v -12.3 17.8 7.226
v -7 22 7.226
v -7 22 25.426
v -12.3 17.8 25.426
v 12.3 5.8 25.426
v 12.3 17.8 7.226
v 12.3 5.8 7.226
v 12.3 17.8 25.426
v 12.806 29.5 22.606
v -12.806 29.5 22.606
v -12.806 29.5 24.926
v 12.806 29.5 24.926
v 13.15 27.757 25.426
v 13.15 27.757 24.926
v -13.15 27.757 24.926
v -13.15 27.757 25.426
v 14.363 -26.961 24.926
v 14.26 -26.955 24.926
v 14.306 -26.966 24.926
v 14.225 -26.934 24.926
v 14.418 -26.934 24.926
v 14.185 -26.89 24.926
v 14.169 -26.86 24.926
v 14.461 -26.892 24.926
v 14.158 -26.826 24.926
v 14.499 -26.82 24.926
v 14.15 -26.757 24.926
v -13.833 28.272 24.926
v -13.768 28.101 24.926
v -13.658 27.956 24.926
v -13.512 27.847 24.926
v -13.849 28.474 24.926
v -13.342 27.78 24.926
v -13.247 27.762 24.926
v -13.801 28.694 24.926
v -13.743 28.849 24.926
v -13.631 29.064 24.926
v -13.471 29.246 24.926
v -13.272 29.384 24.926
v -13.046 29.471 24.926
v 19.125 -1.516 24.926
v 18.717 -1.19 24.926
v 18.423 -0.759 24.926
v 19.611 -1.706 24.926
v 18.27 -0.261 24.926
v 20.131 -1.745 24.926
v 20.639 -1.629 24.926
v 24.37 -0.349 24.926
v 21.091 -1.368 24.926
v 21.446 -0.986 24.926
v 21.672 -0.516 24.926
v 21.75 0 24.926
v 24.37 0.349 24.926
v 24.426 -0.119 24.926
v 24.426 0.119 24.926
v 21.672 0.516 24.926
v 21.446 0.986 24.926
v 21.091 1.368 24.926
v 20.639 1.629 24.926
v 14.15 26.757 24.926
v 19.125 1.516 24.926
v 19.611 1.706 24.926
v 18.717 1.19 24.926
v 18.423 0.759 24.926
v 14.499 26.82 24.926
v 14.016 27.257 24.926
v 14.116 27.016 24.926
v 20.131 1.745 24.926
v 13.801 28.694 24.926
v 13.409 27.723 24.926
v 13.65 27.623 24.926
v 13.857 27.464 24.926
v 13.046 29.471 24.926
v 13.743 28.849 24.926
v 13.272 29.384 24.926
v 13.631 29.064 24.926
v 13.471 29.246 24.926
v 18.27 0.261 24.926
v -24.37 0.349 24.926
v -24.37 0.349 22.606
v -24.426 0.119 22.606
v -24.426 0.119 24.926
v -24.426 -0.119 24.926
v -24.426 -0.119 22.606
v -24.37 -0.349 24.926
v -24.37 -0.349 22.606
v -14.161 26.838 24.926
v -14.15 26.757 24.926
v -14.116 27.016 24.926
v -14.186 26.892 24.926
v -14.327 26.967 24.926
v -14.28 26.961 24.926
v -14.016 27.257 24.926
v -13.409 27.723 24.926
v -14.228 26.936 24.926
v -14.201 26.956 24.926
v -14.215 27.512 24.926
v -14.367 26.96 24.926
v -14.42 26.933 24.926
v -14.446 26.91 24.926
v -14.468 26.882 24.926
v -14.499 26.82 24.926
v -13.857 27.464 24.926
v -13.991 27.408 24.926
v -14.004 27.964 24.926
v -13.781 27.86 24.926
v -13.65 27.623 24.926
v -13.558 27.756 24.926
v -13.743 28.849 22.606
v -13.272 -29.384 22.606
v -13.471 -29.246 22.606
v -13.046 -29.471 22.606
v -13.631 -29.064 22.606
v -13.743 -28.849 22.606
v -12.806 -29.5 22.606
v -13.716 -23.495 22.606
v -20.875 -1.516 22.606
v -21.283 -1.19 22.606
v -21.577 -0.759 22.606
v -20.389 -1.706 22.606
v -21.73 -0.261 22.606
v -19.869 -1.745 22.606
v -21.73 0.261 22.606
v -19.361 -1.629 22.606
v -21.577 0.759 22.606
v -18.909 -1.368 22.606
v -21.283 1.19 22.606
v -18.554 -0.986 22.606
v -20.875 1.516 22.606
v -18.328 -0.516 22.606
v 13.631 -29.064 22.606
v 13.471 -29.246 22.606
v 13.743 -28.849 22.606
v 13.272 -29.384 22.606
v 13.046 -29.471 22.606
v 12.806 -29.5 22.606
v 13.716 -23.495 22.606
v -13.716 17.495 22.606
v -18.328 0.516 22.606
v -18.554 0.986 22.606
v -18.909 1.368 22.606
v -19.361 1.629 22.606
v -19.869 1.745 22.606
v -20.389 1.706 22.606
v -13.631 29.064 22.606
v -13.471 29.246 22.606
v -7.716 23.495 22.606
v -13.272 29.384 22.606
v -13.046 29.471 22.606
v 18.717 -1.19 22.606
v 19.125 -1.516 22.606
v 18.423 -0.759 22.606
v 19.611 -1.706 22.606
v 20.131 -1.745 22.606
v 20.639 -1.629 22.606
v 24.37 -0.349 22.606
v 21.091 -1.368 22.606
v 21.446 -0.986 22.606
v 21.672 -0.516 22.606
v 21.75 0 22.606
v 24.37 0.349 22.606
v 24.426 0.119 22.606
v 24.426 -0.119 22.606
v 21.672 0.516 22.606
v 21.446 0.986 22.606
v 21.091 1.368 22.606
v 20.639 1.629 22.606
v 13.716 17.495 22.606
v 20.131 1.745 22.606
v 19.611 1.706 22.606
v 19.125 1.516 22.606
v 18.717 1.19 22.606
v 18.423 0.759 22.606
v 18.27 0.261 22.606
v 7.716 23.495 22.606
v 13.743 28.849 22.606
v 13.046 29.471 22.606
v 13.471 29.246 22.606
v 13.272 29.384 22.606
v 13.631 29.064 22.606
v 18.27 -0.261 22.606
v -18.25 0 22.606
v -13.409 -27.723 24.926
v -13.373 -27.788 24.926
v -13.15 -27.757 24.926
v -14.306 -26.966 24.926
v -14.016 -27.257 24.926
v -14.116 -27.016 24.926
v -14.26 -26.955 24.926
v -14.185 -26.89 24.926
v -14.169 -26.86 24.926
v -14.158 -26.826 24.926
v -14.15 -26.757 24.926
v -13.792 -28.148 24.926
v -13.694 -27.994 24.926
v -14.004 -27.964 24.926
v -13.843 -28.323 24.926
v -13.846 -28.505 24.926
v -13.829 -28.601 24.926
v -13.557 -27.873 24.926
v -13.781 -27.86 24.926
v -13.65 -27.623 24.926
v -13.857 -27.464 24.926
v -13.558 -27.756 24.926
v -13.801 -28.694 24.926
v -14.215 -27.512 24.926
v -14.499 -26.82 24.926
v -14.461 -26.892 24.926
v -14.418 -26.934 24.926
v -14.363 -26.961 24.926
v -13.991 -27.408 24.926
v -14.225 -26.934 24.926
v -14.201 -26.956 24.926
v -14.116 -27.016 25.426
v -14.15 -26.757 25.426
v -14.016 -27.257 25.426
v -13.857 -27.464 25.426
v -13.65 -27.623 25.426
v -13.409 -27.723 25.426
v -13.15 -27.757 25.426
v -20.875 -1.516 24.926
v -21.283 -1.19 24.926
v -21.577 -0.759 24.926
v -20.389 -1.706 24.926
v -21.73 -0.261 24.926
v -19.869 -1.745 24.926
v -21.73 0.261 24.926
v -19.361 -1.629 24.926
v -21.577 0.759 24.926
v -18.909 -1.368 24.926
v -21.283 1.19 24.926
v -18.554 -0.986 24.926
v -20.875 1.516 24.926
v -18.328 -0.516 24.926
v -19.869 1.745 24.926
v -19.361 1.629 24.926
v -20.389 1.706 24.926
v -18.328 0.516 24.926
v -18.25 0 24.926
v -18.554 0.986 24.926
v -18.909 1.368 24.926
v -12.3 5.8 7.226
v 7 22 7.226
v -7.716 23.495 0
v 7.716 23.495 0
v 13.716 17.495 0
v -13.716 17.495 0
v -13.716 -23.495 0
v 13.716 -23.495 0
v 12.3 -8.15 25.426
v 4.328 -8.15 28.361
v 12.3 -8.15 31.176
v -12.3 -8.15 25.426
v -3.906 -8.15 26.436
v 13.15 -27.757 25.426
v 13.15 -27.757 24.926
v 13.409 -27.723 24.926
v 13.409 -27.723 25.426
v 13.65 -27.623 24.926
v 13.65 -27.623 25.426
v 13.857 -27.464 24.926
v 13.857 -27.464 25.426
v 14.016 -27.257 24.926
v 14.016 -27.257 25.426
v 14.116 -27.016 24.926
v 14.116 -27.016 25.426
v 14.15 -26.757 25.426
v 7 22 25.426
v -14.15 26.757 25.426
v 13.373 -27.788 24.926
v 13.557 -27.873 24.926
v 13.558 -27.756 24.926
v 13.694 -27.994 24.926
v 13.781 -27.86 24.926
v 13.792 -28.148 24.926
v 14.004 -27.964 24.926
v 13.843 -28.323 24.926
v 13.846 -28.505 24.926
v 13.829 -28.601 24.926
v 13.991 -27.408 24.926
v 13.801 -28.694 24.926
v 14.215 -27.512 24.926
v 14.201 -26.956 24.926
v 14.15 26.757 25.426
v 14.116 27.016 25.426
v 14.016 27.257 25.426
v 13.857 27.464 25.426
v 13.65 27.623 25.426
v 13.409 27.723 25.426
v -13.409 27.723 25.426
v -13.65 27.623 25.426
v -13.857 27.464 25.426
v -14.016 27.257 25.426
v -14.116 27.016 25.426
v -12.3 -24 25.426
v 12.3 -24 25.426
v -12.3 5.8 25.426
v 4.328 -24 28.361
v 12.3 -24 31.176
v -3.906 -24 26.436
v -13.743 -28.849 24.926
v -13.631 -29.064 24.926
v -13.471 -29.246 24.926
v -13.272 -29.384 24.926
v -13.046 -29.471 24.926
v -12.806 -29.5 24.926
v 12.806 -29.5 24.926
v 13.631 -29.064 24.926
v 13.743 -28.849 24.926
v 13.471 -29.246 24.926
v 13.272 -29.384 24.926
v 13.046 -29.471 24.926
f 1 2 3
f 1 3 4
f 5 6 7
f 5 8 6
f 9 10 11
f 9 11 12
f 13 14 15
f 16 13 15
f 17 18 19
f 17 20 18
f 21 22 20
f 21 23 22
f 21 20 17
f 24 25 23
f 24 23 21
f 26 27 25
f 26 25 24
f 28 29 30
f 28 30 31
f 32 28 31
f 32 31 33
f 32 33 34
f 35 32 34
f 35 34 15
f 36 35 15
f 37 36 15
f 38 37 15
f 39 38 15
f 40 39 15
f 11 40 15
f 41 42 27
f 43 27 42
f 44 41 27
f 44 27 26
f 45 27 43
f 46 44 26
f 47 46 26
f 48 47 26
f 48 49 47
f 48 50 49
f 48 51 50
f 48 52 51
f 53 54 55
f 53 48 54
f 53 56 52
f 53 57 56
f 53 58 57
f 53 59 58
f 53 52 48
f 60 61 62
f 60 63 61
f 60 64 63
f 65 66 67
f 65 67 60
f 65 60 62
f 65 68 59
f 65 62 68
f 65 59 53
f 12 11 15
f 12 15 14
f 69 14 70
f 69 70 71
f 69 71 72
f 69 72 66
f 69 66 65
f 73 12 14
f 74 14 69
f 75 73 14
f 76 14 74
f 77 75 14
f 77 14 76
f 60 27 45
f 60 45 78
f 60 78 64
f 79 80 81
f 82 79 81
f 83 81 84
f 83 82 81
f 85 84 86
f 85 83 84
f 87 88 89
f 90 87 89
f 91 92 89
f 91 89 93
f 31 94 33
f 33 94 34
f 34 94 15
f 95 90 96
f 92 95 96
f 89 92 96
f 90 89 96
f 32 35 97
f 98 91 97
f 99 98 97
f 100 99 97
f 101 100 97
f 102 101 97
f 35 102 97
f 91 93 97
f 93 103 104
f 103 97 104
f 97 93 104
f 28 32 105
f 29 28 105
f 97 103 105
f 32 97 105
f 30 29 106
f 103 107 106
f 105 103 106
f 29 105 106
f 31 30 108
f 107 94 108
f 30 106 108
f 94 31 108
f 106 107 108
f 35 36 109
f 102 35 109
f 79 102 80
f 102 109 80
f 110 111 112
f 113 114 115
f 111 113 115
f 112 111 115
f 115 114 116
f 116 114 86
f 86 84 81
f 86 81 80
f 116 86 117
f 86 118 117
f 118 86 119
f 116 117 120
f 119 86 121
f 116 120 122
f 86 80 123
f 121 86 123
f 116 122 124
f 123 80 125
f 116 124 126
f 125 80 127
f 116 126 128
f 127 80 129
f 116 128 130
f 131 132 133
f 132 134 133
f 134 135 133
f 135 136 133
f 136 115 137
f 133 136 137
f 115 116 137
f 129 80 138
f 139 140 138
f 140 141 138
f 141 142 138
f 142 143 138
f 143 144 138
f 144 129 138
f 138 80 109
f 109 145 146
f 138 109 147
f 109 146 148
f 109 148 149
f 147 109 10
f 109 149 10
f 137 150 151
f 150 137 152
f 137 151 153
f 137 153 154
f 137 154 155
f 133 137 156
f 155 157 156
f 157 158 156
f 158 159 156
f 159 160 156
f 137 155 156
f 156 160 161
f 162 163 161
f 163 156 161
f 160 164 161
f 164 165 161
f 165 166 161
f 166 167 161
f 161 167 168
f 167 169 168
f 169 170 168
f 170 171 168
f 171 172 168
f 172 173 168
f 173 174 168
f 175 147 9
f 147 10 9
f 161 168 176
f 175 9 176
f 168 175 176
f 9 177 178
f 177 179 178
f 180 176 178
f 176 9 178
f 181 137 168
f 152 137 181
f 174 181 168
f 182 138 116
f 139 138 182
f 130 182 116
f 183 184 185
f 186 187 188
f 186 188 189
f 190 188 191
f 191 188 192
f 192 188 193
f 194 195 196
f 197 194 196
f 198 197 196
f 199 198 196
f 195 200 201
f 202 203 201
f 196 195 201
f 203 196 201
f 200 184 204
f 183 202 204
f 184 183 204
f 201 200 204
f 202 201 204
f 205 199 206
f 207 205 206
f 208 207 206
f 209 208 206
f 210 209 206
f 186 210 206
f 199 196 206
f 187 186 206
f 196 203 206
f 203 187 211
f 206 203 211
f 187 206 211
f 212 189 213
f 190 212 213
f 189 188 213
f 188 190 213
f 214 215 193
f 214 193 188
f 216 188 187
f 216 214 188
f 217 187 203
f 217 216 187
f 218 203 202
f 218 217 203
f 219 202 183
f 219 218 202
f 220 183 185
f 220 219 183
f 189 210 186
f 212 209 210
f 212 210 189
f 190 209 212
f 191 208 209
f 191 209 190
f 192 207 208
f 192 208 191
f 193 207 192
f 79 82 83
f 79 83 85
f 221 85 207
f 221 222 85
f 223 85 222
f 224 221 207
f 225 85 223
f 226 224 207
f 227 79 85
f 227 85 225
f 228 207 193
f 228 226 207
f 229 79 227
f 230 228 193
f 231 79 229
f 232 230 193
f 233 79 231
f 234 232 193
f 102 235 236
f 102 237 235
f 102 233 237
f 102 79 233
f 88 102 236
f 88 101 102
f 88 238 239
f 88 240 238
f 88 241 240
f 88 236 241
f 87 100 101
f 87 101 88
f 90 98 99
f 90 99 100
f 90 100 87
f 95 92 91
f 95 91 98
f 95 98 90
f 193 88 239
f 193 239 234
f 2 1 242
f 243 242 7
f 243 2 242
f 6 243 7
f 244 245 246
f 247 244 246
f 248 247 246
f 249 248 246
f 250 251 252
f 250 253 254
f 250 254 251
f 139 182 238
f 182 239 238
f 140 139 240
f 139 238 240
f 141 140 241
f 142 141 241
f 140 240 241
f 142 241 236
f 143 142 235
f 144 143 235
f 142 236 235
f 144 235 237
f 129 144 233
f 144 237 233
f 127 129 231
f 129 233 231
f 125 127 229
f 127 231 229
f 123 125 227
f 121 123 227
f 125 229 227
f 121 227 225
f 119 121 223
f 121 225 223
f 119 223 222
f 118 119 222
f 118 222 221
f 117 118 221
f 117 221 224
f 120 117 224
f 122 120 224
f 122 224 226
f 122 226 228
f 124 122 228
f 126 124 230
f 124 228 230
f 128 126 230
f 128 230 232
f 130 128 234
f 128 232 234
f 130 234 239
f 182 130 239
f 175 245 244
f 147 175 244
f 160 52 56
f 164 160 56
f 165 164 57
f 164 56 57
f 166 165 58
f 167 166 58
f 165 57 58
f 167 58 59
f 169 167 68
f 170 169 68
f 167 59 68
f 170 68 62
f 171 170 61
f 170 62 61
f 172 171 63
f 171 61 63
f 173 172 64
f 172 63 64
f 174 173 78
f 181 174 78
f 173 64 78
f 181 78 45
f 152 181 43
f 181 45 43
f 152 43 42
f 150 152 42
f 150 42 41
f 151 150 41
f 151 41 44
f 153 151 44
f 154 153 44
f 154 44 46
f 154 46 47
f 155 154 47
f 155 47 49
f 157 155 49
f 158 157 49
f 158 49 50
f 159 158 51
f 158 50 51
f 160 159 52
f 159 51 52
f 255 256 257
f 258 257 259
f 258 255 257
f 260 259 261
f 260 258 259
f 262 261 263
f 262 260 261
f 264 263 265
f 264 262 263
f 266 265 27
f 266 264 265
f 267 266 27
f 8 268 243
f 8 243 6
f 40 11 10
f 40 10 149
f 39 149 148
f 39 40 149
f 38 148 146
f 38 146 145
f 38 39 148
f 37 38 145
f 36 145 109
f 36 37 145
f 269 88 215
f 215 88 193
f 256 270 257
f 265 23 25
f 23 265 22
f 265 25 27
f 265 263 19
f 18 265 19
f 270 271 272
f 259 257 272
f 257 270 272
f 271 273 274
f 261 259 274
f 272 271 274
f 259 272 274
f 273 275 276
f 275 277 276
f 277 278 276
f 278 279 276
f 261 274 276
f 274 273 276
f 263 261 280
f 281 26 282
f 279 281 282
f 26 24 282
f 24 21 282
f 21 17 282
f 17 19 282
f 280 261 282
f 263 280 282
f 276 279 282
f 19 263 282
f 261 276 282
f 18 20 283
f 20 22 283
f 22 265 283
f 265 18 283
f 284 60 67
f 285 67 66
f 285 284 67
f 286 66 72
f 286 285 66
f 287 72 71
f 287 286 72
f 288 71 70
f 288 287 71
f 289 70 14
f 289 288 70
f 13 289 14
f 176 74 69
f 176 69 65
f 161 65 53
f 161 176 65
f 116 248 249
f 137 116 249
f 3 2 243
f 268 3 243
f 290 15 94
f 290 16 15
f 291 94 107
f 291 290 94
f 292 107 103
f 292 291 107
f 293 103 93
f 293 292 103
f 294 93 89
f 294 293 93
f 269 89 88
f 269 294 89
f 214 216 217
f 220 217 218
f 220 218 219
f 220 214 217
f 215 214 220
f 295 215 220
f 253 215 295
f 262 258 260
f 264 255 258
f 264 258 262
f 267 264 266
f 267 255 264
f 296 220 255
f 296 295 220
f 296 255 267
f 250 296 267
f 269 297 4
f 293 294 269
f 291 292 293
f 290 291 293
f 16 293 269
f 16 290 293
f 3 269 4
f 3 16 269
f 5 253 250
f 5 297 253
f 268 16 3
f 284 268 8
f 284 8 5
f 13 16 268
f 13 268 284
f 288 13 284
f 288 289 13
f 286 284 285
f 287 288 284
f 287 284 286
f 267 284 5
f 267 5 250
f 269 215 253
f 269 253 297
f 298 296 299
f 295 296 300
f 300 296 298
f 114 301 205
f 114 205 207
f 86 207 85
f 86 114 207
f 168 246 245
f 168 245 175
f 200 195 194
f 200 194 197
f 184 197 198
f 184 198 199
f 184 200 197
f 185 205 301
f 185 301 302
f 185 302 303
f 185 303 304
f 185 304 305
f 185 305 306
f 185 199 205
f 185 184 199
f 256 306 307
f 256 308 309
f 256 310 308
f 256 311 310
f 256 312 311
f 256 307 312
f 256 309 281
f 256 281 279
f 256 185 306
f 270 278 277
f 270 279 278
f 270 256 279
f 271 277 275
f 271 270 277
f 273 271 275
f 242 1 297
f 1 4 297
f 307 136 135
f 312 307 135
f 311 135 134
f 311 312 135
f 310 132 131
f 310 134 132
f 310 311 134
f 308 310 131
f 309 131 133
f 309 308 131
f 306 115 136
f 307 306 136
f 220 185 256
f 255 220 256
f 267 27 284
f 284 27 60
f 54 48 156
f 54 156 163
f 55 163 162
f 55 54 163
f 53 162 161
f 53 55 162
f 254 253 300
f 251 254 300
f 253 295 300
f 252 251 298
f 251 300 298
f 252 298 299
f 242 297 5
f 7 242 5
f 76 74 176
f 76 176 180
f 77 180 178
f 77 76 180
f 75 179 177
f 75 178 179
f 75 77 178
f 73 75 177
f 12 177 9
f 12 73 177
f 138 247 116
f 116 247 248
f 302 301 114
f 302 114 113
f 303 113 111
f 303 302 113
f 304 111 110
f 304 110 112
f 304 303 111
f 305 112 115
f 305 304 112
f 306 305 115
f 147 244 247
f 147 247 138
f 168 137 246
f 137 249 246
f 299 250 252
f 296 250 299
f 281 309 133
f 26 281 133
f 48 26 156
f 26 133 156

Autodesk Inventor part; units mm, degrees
ref_plane "YZ Plane" through (0, 0, 0) normal (1, 0, 0) x (0, 1, 0)
ref_plane "XZ Plane" through (0, 0, 0) normal (0, 1, 0) x (-1, 0, 0)
ref_plane "XY Plane" through (0, 0, 0) normal (0, 0, 1) x (1, 0, 0)
sketch "Body" plane through (0, 0, 0) normal (0, 0, 1) x (1, 0, 0)
  line L0 (-13.716, -23.495) -> (13.716, -23.495)
  line L1 (13.716, -23.495) -> (13.716, 23.495)
  line L2 (13.716, 23.495) -> (-13.716, 23.495)
  line L3 (-13.716, 23.495) -> (-13.716, -23.495)
  line L4 (-13.716, -23.495) -> (13.716, 23.495) construction
  line L5 (13.716, -23.495) -> (-13.716, 23.495) construction
  point P0 (0, 0)
  dimension "d0" = 27.432
  dimension "d1" = 46.99
extrude "BodyFeature" add sketch "Body" along normal blind 22.606
chamfer "OutsideChamfersFeature" distance 6 angle 45 2 edges at (13.716, 23.495, 11.303) (-13.716, 23.495, 11.303)
sketch "Mount" plane through (0, 0, 22.606) normal (0, 0, 1) x (1, 0, 0)
  line L0 (-24.5, -29.5) -> (24.5, -29.5) construction
  line L1 (24.5, -29.5) -> (24.5, 29.5) construction
  line L2 (24.5, 29.5) -> (-24.5, 29.5) construction
  line L3 (-24.5, 29.5) -> (-24.5, -29.5) construction
  line L4 (-24.5, -29.5) -> (24.5, 29.5) construction
  line L5 (24.5, -29.5) -> (-24.5, 29.5) construction
  line L6 (-13.5, 29.5) -> (13.5, 29.5)
  line L7 (-13.5, 29.5) -> (-24.5, 0)
  line L8 (13.5, 29.5) -> (24.5, 0)
  line L9 (-33.6, 0) -> (33.6, 0) construction
  line L10 (-13.5, -29.5) -> (13.5, -29.5)
  line L11 (-13.5, -29.5) -> (-24.5, 0)
  line L12 (13.5, -29.5) -> (24.5, 0)
  point P0 (0, 0)
  point P1 (0, 29.5)
  dimension "d7" = 59
  dimension "d8" = 49
  dimension "d9" = 27
extrude "MountFeature" add sketch "Mount" along normal blind 2.32
fillet "MountFilletsFeature" radius 1 6 edges at (-13.5, 29.5, 23.766) (13.5, 29.5, 23.766) (-24.5, 0, 23.766) (24.5, 0, 23.766) (13.5, -29.5, 23.766) (-13.5, -29.5, 23.766)
sketch "MountHoles" plane through (0, 0, 24.926) normal (0, 0, 1) x (1, 0, 0)
  line L0 (-34.3, 0) -> (34.3, 0) construction
  circle A0 centre (-20, 0) radius 1.75
  line L1 (0, -41.3) -> (0, 41.3) construction
  circle A1 centre (20, 0) radius 1.75
  point P0 (0, 0)
  dimension "d13" = 3.5
  dimension "d14" = 40
extrude "MountHolesFeature" cut sketch "MountHoles" against normal blind 3.5
sketch "FrontPanel" plane through (0, 0, 24.926) normal (0, 0, 1) x (1, 0, 0)
  line L0 (-14.15, -27.7568) -> (14.15, -27.7568)
  line L1 (14.15, -27.7568) -> (14.15, 27.7568)
  line L2 (14.15, 27.7568) -> (-14.15, 27.7568)
  line L3 (-14.15, 27.7568) -> (-14.15, -27.7568)
  line L4 (-14.15, -27.7568) -> (14.15, 27.7568) construction
  line L5 (14.15, -27.7568) -> (-14.15, 27.7568) construction
  line L6 (24.3697, 0.3494) -> (13.7426, 28.8494) construction
  point P0 (0, 0)
  dimension "d17" = 28.3
extrude "FrontPanelFeature" add sketch "FrontPanel" along normal blind 0.5
fillet "FrontPanelFilletsFeature" radius 1 4 edges at (-14.15, -27.7568, 25.176) (14.15, -27.7568, 25.176) (-14.15, 27.7568, 25.176) (14.15, 27.7568, 25.176)
sketch "PowerReceptacle" plane through (0, 0, 25.426) normal (0, 0, 1) x (1, 0, 0)
  line L0 (0, -41.3) -> (0, 41.3) construction
  line L1 (-12.3, 22) -> (12.3, 22) construction
  line L2 (12.3, 22) -> (12.3, 5.8) construction
  line L3 (12.3, 5.8) -> (-12.3, 5.8) construction
  line L4 (-12.3, 5.8) -> (-12.3, 22) construction
  line L5 (-12.3, 22) -> (12.3, 5.8) construction
  line L6 (12.3, 22) -> (-12.3, 5.8) construction
  line L7 (12.8056, 29.5) -> (-12.8056, 29.5) construction
  line L8 (-7, 22) -> (7, 22)
  line L9 (-7, 22) -> (-12.3, 17.8)
  line L10 (-12.3, 17.8) -> (-12.3, 5.8)
  line L11 (7.716, 23.495) -> (-7.716, 23.495) projected
  line L12 (7, 22) -> (12.3, 17.8)
  line L13 (12.3, 17.8) -> (12.3, 5.8)
  line L14 (-12.3, 5.8) -> (12.3, 5.8)
  line L15 (14.15, 26.7568) -> (14.15, -26.7568) projected
  point P0 (0, 0)
  point P1 (0, 13.9)
  point P2 (0, 22)
  dimension "d22" = 24.6
  dimension "d23" = 16.2
  dimension "d24" = 7.5
  dimension "d25" = 14
  dimension "d26" = 12
extrude "PowerReceptacleFeature" cut sketch "PowerReceptacle" against normal blind 18.2
sketch "Switch" plane through (0, 0, 25.426) normal (0, 0, 1) x (1, 0, 0)
  line L0 (0, -41.3) -> (0, 41.3) construction
  line L1 (-12.3, -8.15) -> (12.3, -8.15)
  line L2 (12.3, -8.15) -> (12.3, -24)
  line L3 (12.3, -24) -> (-12.3, -24)
  line L4 (-12.3, -24) -> (-12.3, -8.15)
  line L5 (-12.3, -8.15) -> (12.3, -24) construction
  line L6 (12.3, -8.15) -> (-12.3, -24) construction
  line L7 (-12.8056, -29.5) -> (12.8056, -29.5) projected
  line L8 (-12.3, 5.8) -> (-12.3, 17.8) projected
  line L9 (12.3, 17.8) -> (12.3, 5.8) projected
  point P0 (0, 0)
  point P1 (0, -16.075)
  dimension "d29" = 5.5
  dimension "d30" = 15.85
extrude "SwitchFeature" add sketch "Switch" along normal blind 5.75
sketch "SwitchProfile" plane through (-12.3, -24, 25.426) normal (0, -1, 0) x (1, 0, 0)
  line L0 (24.6, 0) -> (0, 0) projected
  line L1 (24.6, 0) -> (24.6, 5.75) projected
  line L2 (0, 5.75) -> (24.6, 5.75) projected
  line L3 (0, 0) -> (0, 5.75) projected
  arc A0 (0, 0) -> (24.6, 5.75) centre (-4.9882, 76.8383) ccw
  point P0 (12.3, -25.426)
  dimension "d33" = 77
extrude "SwitchProfileFeature" cut sketch "SwitchProfile" against normal up to surface (15.85 mm away) contours L3 L2 A0
equation "\"d15\" = d13"
properties part number "AC-14-F16A"
